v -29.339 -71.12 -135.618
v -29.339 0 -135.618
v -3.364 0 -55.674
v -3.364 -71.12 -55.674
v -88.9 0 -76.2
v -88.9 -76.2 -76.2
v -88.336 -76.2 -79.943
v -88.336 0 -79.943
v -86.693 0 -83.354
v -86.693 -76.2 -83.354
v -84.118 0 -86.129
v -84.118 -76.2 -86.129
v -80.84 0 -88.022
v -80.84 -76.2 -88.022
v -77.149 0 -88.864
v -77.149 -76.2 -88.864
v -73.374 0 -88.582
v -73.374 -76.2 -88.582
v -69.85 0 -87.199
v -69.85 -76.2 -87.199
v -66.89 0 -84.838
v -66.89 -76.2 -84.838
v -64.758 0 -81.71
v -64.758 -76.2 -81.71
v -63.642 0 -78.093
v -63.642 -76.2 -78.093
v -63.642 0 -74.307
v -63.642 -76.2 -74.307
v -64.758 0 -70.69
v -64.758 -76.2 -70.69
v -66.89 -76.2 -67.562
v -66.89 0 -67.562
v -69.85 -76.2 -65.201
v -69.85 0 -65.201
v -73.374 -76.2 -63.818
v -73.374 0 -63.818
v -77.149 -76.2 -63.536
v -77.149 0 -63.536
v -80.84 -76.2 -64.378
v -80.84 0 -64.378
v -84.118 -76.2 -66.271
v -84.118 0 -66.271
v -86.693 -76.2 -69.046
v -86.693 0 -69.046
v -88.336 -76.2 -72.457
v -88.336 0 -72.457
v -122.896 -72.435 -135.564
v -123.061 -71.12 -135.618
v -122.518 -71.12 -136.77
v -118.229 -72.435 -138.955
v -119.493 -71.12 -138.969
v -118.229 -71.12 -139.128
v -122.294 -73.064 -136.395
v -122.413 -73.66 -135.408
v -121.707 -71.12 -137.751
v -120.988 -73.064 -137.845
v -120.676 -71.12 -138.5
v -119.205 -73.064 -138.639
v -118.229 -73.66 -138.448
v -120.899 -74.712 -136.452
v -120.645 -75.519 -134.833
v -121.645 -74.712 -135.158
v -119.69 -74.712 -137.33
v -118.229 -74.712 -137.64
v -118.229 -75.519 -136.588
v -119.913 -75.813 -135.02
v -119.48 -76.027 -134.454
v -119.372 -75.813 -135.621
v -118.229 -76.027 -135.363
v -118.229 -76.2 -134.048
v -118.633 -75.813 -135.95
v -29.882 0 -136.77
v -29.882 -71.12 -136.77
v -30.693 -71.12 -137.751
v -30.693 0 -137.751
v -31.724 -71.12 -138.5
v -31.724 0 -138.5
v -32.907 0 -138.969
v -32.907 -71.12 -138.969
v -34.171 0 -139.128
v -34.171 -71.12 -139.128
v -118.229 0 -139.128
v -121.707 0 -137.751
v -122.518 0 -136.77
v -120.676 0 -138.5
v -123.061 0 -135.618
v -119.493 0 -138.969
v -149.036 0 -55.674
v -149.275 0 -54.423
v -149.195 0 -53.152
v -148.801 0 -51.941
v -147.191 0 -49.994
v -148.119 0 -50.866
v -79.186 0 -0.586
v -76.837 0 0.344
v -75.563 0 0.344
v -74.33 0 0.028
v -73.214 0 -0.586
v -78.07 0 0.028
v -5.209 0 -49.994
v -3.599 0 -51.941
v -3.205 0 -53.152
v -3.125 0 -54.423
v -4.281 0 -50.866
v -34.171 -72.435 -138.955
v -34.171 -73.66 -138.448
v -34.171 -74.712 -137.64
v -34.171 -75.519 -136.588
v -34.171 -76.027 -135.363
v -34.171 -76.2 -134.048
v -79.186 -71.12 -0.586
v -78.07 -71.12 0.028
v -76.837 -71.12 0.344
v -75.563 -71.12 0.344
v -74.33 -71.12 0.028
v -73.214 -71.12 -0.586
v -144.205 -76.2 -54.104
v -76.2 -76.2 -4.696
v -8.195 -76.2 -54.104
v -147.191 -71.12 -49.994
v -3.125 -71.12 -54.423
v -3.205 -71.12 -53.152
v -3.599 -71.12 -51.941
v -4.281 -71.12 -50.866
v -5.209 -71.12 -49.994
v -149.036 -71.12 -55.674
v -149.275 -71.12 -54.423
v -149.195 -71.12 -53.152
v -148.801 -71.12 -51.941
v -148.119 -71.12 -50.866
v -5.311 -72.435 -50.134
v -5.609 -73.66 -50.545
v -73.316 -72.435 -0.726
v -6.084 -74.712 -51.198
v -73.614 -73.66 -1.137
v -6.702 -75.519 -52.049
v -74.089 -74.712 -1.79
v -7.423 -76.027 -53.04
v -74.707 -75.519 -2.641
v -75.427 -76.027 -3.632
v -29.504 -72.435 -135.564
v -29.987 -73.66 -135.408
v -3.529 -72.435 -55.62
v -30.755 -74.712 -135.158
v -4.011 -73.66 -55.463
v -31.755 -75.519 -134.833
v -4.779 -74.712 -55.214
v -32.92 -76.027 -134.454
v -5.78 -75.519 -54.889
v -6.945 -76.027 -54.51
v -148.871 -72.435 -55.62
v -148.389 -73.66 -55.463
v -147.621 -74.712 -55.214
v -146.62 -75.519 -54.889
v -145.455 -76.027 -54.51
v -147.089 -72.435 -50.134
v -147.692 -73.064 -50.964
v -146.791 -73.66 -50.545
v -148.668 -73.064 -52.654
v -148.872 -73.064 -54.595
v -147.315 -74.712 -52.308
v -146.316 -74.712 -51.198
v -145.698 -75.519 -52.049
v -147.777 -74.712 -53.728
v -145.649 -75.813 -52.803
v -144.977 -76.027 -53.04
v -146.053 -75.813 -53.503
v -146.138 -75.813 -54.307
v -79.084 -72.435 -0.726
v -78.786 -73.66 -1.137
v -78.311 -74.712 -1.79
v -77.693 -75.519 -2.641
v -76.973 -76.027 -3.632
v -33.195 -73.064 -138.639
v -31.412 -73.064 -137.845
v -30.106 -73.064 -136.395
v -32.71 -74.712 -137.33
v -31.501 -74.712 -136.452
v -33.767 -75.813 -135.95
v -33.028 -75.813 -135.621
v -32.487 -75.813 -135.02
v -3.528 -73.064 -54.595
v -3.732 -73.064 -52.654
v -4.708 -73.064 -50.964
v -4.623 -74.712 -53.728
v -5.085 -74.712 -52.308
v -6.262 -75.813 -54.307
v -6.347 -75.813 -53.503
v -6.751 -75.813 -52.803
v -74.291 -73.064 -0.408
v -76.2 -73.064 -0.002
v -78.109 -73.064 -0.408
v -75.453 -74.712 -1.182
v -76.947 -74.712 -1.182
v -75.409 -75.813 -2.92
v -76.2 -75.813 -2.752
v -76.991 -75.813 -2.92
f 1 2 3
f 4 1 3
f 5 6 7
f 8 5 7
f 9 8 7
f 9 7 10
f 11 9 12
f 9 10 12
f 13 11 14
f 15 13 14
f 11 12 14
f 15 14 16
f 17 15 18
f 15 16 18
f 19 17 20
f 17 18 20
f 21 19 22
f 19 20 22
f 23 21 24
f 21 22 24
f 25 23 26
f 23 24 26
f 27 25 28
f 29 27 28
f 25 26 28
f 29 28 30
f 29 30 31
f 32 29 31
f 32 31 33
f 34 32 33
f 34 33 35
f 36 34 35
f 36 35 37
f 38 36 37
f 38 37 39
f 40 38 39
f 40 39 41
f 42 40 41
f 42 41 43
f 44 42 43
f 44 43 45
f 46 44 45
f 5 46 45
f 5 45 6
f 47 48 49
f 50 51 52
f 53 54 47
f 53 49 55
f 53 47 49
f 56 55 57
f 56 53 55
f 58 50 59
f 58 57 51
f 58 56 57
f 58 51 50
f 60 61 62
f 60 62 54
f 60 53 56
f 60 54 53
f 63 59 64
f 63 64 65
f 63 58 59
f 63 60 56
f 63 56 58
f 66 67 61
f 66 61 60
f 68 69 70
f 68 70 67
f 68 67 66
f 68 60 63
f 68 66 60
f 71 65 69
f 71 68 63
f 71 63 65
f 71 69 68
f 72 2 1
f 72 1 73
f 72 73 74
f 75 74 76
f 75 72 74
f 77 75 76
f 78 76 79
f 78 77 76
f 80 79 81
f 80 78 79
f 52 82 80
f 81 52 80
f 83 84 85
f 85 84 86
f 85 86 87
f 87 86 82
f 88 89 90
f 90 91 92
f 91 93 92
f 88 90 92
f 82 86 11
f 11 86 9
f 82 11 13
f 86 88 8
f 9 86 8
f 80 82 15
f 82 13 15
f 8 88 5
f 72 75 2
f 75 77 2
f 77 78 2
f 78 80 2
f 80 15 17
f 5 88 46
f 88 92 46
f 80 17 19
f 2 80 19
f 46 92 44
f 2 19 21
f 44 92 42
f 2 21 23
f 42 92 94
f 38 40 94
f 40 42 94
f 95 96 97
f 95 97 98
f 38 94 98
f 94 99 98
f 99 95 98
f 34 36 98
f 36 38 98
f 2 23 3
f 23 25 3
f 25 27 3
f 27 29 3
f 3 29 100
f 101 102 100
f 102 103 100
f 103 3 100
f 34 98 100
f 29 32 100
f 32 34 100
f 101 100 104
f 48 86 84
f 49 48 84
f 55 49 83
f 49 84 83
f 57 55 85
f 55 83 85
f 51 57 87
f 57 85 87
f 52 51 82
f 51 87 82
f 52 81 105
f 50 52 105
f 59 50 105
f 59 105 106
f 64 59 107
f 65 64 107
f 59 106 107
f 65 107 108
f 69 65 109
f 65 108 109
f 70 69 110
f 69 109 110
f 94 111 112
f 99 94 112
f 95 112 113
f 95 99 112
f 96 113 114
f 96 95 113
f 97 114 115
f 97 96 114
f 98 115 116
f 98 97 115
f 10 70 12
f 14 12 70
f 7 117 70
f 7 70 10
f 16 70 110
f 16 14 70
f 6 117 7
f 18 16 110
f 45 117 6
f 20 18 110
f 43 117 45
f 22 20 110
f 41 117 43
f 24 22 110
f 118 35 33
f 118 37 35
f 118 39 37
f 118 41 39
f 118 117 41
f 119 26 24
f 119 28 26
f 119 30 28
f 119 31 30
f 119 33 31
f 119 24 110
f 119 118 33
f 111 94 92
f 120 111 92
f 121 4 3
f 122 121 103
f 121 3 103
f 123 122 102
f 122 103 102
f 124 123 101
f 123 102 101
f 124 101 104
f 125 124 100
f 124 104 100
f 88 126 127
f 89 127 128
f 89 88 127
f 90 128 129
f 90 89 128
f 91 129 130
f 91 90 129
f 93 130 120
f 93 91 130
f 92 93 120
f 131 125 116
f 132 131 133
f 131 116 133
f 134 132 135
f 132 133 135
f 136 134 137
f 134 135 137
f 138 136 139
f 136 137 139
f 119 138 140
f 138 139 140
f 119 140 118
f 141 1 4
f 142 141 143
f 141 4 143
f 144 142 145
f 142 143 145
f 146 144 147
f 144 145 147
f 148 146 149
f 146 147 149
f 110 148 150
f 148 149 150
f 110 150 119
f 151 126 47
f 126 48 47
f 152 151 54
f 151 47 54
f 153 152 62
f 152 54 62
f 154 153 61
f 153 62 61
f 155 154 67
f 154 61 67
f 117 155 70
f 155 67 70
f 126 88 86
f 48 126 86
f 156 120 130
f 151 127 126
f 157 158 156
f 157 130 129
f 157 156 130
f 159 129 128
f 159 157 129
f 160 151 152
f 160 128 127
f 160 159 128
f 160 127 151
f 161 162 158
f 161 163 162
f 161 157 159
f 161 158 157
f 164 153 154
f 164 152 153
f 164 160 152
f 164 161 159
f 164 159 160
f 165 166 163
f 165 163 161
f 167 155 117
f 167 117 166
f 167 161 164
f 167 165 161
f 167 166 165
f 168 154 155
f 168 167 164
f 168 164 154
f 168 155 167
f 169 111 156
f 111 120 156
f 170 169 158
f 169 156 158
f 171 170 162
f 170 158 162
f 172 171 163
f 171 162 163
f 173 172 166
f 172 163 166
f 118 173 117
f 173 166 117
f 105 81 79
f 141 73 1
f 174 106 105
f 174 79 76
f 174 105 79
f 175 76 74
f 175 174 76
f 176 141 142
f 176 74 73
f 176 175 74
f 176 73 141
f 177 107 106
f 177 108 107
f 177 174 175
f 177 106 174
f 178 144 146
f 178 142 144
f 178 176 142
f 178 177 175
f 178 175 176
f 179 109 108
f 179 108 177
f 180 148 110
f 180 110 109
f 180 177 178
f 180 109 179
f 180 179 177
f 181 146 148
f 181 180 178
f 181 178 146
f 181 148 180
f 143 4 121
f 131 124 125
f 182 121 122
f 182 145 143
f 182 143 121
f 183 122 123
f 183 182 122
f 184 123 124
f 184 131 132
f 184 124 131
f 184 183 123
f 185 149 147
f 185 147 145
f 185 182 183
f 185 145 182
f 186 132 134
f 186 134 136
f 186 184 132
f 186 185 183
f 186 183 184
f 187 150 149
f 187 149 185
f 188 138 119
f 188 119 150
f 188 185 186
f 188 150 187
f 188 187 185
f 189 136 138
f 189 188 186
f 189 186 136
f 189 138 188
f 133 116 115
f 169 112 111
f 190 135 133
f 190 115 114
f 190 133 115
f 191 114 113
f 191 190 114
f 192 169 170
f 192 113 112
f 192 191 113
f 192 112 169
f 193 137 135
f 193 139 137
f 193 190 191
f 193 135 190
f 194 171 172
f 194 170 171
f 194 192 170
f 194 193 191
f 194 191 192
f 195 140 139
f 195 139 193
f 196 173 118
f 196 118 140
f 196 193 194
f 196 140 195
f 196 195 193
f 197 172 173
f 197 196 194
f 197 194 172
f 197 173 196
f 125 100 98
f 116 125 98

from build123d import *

# Parameters (mm, degrees)
F1_DEPTH     = 76.2
F2_R         = 5.08
F3_T1_DEPTH  = 80.3470901057
F3_T6_DEPTH  = 5.08
F5_T1_DEPTH  = 80.3470901057
F5_T6_DEPTH  = 5.08
F5_T12_DEPTH = 5.08
F6_T1_DEPTH  = 80.3470901057
F6_T6_DEPTH  = 5.08
F6_T12_DEPTH = 5.08
F7_D         = 25.4


# Not quite as in the source:
# - a fillet or chamfer that OpenCascade refuses, or shapes differently, is made with other operations: its cross-section is extruded or revolved along the edge and cut away or added
# - a feature of the source that left no trace in its solid (it failed there, or was rolled back) is left out


with BuildPart() as f1:
    # F0 (on Front) → F1 (new body)
    with BuildSketch(Plane.XZ):
        Polygon((-30.48, -139.1281814039), (-2.2234860344, -52.1635735539), (-76.2, 1.5835099157), (-150.1765139656, -52.1635735539), (-121.92, -139.1281814039), align=None)
    extrude(amount=F1_DEPTH)

    # F2
    f2_edges = [f1.edges().sort_by_distance(p)[0] for p in [
        (-16.351743, -76.2, -95.645877),
        (-39.211743, -76.2, -25.290032),
        (-113.188257, -76.2, -25.290032),
        (-136.048257, -76.2, -95.645877),
        (-76.2, -76.2, -139.128181),
    ]]
    fillet(f2_edges, radius=F2_R)

    # F3: fillet of radius 5.08 on 1 edges, made by hand

    # F3_s2 → F3_t1 (cut)
    with BuildSketch(Plane.XZ.offset(-9.2270901057)):
        with BuildLine():
            ThreePointArc((-149.0359829051, -55.6737672225), (-149.0359829051, -52.5341545596), (-147.190564884, -49.9941545596))
            Line((-147.190564884, -49.9941545596), (-150.1765139656, -52.1635735539))
            Line((-150.1765139656, -52.1635735539), (-149.0359829051, -55.6737672225))
        make_face()
    extrude(amount=F3_T1_DEPTH, mode=Mode.SUBTRACT)


with BuildPart() as f3_tool4:
    # F3_s5 → F3_t6 (new body)
    with BuildSketch(Plane.XZ.offset(71.12)):
        Polygon((-144.2046158024, -54.1039608911), (-149.0359829051, -55.6737672225), (-150.1765139656, -52.1635735539), (-147.190564884, -49.9941545596), align=None)
    extrude(amount=F3_T6_DEPTH)

    # F3_s7 → F3_t8 (revolve, cut)
    with BuildSketch(Plane(origin=(-144.2046158024, -71.12, -54.1039608911), x_dir=(0.9510565163, 0, -0.3090169944), z_dir=(-0.3090169944, 0, -0.9510565163))):
        with BuildLine():
            ThreePointArc((0, -5.08), (5.08, 0), (0, 5.08))
            Line((0, 5.08), (0, -5.08))
        make_face()
    revolve(axis=Axis((-144.2046158024, -71.12, -54.1039608911), (0, -1, 0)), mode=Mode.SUBTRACT)


with BuildPart() as f1_1:
    add(f1.part)

    # F3_t3: cut F3_tool4
    add(f3_tool4.part, mode=Mode.SUBTRACT)

    # F5: fillet of radius 5.08 on 2 edges, made by hand

    # F5_s2 → F5_t1 (cut)
    with BuildSketch(Plane.XZ.offset(-9.2270901057)):
        with BuildLine():
            ThreePointArc((-29.3394689395, -135.6179877354), (-31.1848869606, -138.1579877354), (-34.1708360423, -139.1281814039))
            Line((-34.1708360423, -139.1281814039), (-30.48, -139.1281814039))
            Line((-30.48, -139.1281814039), (-29.3394689395, -135.6179877354))
        make_face()
        with BuildLine():
            ThreePointArc((-3.3640170949, -55.6737672225), (-3.3640170949, -52.5341545596), (-5.209435116, -49.9941545596))
            Line((-5.209435116, -49.9941545596), (-2.2234860344, -52.1635735539))
            Line((-2.2234860344, -52.1635735539), (-3.3640170949, -55.6737672225))
        make_face()
    extrude(amount=F5_T1_DEPTH, mode=Mode.SUBTRACT)


with BuildPart() as f5_tool4:
    # F5_s5 → F5_t6 (new body)
    with BuildSketch(Plane.XZ.offset(71.12)):
        Polygon((-8.1953841976, -54.1039608911), (-3.3640170949, -55.6737672225), (-2.2234860344, -52.1635735539), (-5.209435116, -49.9941545596), align=None)
    extrude(amount=F5_T6_DEPTH)

    # F5_s7 → F5_t8 (revolve, cut)
    with BuildSketch(Plane(origin=(-8.1953841976, -71.12, -54.1039608911), x_dir=(-0.9510565163, 0, -0.3090169944), z_dir=(-0.3090169944, 0, 0.9510565163))):
        with BuildLine():
            ThreePointArc((0, -5.08), (5.08, 0), (0, 5.08))
            Line((0, 5.08), (0, -5.08))
        make_face()
    revolve(axis=Axis((-8.1953841976, -71.12, -54.1039608911), (0, -1, 0)), mode=Mode.SUBTRACT)


with BuildPart() as f1_2:
    add(f1_1.part)

    # F5_t3: cut F5_tool4
    add(f5_tool4.part, mode=Mode.SUBTRACT)


with BuildPart() as f5_tool10:
    # F5_s11 → F5_t12 (new body)
    with BuildSketch(Plane.XZ.offset(71.12)):
        Polygon((-34.1708360423, -134.0481814039), (-29.3394689395, -135.6179877354), (-30.48, -139.1281814039), (-34.1708360423, -139.1281814039), align=None)
    extrude(amount=F5_T12_DEPTH)

    # F5_s13 → F5_t14 (revolve, cut)
    with BuildSketch(Plane(origin=(-34.1708360423, -71.12, -134.0481814039), x_dir=(-0.5877852523, 0, 0.8090169944), z_dir=(0.8090169944, 0, 0.5877852523))):
        with BuildLine():
            ThreePointArc((0, -5.08), (5.08, 0), (0, 5.08))
            Line((0, 5.08), (0, -5.08))
        make_face()
    revolve(axis=Axis((-34.1708360423, -71.12, -134.0481814039), (0, -1, 0)), mode=Mode.SUBTRACT)


with BuildPart() as f1_3:
    add(f1_2.part)

    # F5_t9: cut F5_tool10
    add(f5_tool10.part, mode=Mode.SUBTRACT)

    # F6: fillet of radius 5.08 on 2 edges, made by hand

    # F6_s2 → F6_t1 (cut)
    with BuildSketch(Plane.XZ.offset(-9.2270901057)):
        with BuildLine():
            ThreePointArc((-79.1859490816, -0.5859090786), (-76.2, 0.38428459), (-73.2140509184, -0.5859090786))
            Line((-73.2140509184, -0.5859090786), (-76.2, 1.5835099157))
            Line((-76.2, 1.5835099157), (-79.1859490816, -0.5859090786))
        make_face()
        with BuildLine():
            ThreePointArc((-123.0605310605, -135.6179877354), (-121.2151130394, -138.1579877354), (-118.2291639577, -139.1281814039))
            Line((-118.2291639577, -139.1281814039), (-121.92, -139.1281814039))
            Line((-121.92, -139.1281814039), (-123.0605310605, -135.6179877354))
        make_face()
    extrude(amount=F6_T1_DEPTH, mode=Mode.SUBTRACT)


with BuildPart() as f6_tool4:
    # F6_s5 → F6_t6 (new body)
    with BuildSketch(Plane.XZ.offset(71.12)):
        Polygon((-118.2291639577, -134.0481814039), (-123.0605310605, -135.6179877354), (-121.92, -139.1281814039), (-118.2291639577, -139.1281814039), align=None)
    extrude(amount=F6_T6_DEPTH)

    # F6_s7 → F6_t8 (revolve, cut)
    with BuildSketch(Plane(origin=(-118.2291639577, -71.12, -134.0481814039), x_dir=(0.5877852523, 0, 0.8090169944), z_dir=(0.8090169944, 0, -0.5877852523))):
        with BuildLine():
            ThreePointArc((0, -5.08), (5.08, 0), (0, 5.08))
            Line((0, 5.08), (0, -5.08))
        make_face()
    revolve(axis=Axis((-118.2291639577, -71.12, -134.0481814039), (0, -1, 0)), mode=Mode.SUBTRACT)


with BuildPart() as f1_4:
    add(f1_3.part)

    # F6_t3: cut F6_tool4
    add(f6_tool4.part, mode=Mode.SUBTRACT)


with BuildPart() as f6_tool10:
    # F6_s11 → F6_t12 (new body)
    with BuildSketch(Plane.XZ.offset(71.12)):
        Polygon((-76.2, -4.69571541), (-79.1859490816, -0.5859090786), (-76.2, 1.5835099157), (-73.2140509184, -0.5859090786), align=None)
    extrude(amount=F6_T12_DEPTH)

    # F6_s13 → F6_t14 (revolve, cut)
    with BuildSketch(Plane(origin=(-76.2, -71.12, -4.69571541), x_dir=(0, 0, -1), z_dir=(-1, 0, 0))):
        with BuildLine():
            ThreePointArc((0, -5.08), (5.08, 0), (0, 5.08))
            Line((0, 5.08), (0, -5.08))
        make_face()
    revolve(axis=Axis((-76.2, -71.12, -4.69571541), (0, -1, 0)), mode=Mode.SUBTRACT)


with BuildPart() as f1_5:
    add(f1_4.part)

    # F6_t9: cut F6_tool10
    add(f6_tool10.part, mode=Mode.SUBTRACT)

    # F7 (through all)
    with Locations(Plane(origin=(0, 0, 0), x_dir=(1, 0, 0), z_dir=(0, 1, 0))):
        with Locations((-76.2, 76.2)):
            Hole(F7_D / 2)


solid = f1_5.part
